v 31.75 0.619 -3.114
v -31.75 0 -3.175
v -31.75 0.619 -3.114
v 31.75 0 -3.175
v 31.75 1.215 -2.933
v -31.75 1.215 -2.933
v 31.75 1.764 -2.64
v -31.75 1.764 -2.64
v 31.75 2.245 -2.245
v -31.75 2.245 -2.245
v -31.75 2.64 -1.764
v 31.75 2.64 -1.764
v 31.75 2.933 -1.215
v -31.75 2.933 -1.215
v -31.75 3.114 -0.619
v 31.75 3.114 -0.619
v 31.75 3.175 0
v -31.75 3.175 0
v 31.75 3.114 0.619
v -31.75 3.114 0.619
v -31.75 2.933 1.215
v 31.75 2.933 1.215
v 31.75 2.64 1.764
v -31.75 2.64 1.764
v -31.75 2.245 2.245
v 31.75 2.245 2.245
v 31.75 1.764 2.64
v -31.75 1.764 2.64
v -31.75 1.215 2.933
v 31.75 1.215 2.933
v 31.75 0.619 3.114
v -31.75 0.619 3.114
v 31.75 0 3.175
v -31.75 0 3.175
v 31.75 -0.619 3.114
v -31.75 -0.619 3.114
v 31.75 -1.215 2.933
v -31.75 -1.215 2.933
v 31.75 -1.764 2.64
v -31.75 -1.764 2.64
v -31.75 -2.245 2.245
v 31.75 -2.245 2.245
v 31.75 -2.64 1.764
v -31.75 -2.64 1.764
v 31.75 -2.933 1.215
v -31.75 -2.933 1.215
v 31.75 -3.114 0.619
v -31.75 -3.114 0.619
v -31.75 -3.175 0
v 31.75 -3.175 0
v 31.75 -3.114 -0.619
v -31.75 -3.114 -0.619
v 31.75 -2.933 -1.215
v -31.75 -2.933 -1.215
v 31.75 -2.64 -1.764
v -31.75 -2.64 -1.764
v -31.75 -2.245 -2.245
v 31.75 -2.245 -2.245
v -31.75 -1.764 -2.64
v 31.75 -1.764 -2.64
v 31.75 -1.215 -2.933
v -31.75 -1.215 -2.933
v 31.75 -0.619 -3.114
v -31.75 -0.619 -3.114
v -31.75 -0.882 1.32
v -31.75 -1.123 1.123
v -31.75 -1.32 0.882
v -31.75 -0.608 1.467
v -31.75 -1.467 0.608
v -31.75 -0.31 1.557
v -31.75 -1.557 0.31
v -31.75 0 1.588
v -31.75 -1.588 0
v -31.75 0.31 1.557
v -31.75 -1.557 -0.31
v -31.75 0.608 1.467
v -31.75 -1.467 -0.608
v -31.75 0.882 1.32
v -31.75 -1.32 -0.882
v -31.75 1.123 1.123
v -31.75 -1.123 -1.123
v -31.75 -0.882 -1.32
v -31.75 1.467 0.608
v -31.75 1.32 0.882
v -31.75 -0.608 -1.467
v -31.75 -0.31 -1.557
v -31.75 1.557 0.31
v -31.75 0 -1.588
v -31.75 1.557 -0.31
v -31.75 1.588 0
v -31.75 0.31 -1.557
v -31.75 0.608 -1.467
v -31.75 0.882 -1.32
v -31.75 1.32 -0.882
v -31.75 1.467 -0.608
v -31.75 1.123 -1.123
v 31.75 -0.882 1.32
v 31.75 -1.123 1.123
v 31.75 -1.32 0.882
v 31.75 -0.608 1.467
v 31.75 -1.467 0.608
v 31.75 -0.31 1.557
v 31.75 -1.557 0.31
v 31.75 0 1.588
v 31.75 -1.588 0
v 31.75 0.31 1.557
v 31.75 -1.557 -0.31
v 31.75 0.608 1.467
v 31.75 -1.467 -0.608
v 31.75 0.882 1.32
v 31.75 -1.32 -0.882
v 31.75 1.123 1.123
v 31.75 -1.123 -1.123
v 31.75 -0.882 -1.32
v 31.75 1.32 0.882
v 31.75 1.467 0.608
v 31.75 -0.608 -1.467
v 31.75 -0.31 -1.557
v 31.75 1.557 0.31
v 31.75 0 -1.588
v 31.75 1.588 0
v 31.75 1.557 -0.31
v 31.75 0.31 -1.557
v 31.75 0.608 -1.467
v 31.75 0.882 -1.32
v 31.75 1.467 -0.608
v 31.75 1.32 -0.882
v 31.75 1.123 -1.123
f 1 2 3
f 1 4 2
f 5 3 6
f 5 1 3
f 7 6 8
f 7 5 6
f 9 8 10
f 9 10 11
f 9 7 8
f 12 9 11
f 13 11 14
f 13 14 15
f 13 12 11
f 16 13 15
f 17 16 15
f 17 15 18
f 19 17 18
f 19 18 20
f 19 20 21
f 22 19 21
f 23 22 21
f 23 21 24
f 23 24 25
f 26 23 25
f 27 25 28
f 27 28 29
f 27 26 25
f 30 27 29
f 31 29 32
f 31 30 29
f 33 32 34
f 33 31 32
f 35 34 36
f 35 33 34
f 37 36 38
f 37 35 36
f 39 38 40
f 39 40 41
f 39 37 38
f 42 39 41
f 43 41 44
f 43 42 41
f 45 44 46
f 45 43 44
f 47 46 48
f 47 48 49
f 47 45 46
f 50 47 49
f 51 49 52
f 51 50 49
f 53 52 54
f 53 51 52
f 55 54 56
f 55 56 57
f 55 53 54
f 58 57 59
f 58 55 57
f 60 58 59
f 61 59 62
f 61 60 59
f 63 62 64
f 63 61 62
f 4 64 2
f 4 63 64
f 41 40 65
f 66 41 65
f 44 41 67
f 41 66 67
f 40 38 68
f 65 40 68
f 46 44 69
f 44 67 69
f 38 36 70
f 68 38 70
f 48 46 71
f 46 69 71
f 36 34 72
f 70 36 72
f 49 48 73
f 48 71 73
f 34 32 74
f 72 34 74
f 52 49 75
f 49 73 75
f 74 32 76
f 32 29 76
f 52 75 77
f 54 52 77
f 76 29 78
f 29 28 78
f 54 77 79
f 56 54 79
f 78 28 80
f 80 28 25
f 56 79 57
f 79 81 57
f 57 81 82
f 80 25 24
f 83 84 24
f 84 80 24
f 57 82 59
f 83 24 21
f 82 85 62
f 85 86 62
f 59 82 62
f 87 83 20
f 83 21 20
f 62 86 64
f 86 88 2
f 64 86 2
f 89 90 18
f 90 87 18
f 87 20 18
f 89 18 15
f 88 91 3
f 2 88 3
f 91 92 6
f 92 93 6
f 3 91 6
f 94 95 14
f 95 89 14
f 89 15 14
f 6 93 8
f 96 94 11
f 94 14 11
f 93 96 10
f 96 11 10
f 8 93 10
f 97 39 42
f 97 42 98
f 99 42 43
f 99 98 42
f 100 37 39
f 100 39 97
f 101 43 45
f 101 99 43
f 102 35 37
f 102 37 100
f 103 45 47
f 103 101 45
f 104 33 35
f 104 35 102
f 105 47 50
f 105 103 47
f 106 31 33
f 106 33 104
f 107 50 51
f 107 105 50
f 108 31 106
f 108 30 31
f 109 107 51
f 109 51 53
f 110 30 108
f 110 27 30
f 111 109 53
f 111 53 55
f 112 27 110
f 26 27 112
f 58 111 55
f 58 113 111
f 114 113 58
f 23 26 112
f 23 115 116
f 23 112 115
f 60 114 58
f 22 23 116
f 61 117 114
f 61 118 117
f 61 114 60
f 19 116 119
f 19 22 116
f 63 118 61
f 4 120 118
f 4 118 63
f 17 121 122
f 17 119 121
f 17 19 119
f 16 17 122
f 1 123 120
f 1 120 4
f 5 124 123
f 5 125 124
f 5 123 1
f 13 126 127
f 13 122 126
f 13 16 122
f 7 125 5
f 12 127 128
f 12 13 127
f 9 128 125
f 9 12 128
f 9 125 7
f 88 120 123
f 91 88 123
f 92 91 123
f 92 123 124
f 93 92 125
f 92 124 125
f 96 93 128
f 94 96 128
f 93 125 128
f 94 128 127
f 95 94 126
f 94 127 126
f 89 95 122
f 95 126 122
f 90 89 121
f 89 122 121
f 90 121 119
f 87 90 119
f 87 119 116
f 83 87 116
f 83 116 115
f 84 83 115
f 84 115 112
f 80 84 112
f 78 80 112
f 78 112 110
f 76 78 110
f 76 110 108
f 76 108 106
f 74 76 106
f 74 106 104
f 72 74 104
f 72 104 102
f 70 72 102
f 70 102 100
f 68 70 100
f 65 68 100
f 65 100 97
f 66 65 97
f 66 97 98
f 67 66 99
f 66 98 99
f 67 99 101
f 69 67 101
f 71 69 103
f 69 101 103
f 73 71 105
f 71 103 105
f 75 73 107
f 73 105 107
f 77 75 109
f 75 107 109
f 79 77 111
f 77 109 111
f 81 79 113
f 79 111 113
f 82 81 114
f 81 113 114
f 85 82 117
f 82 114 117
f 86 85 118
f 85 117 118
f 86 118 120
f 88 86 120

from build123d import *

# Parameters (mm, degrees)
SKETCH1_R           = 6.35
BOSS_EXTRUDE1_DEPTH = 63.5
SKETCH2_R           = 3.175
CUT_EXTRUDE1_DEPTH  = 128.317104114
SCALE1_SCALE        = 0.5


with BuildPart() as part:
    # Sketch1 → Boss-Extrude1 (new, symmetric)
    with BuildSketch(Plane(origin=(0, 0, 0), x_dir=(0, 0, -1), z_dir=(1, 0, 0))):
        Circle(SKETCH1_R)
    extrude(amount=BOSS_EXTRUDE1_DEPTH, both=True)

    # Sketch2 → Cut-Extrude1 (cut, through all)
    with BuildSketch(Plane(origin=(63.5, 0, 0), x_dir=(0, 0, -1), z_dir=(1, 0, 0))):
        Circle(SKETCH2_R)
    extrude(amount=-CUT_EXTRUDE1_DEPTH, mode=Mode.SUBTRACT)


with BuildPart() as part_1:
    # Scale1: scaled about (0, 0, 0)
    add(part.part.scale(SCALE1_SCALE))


solid = part_1.part
